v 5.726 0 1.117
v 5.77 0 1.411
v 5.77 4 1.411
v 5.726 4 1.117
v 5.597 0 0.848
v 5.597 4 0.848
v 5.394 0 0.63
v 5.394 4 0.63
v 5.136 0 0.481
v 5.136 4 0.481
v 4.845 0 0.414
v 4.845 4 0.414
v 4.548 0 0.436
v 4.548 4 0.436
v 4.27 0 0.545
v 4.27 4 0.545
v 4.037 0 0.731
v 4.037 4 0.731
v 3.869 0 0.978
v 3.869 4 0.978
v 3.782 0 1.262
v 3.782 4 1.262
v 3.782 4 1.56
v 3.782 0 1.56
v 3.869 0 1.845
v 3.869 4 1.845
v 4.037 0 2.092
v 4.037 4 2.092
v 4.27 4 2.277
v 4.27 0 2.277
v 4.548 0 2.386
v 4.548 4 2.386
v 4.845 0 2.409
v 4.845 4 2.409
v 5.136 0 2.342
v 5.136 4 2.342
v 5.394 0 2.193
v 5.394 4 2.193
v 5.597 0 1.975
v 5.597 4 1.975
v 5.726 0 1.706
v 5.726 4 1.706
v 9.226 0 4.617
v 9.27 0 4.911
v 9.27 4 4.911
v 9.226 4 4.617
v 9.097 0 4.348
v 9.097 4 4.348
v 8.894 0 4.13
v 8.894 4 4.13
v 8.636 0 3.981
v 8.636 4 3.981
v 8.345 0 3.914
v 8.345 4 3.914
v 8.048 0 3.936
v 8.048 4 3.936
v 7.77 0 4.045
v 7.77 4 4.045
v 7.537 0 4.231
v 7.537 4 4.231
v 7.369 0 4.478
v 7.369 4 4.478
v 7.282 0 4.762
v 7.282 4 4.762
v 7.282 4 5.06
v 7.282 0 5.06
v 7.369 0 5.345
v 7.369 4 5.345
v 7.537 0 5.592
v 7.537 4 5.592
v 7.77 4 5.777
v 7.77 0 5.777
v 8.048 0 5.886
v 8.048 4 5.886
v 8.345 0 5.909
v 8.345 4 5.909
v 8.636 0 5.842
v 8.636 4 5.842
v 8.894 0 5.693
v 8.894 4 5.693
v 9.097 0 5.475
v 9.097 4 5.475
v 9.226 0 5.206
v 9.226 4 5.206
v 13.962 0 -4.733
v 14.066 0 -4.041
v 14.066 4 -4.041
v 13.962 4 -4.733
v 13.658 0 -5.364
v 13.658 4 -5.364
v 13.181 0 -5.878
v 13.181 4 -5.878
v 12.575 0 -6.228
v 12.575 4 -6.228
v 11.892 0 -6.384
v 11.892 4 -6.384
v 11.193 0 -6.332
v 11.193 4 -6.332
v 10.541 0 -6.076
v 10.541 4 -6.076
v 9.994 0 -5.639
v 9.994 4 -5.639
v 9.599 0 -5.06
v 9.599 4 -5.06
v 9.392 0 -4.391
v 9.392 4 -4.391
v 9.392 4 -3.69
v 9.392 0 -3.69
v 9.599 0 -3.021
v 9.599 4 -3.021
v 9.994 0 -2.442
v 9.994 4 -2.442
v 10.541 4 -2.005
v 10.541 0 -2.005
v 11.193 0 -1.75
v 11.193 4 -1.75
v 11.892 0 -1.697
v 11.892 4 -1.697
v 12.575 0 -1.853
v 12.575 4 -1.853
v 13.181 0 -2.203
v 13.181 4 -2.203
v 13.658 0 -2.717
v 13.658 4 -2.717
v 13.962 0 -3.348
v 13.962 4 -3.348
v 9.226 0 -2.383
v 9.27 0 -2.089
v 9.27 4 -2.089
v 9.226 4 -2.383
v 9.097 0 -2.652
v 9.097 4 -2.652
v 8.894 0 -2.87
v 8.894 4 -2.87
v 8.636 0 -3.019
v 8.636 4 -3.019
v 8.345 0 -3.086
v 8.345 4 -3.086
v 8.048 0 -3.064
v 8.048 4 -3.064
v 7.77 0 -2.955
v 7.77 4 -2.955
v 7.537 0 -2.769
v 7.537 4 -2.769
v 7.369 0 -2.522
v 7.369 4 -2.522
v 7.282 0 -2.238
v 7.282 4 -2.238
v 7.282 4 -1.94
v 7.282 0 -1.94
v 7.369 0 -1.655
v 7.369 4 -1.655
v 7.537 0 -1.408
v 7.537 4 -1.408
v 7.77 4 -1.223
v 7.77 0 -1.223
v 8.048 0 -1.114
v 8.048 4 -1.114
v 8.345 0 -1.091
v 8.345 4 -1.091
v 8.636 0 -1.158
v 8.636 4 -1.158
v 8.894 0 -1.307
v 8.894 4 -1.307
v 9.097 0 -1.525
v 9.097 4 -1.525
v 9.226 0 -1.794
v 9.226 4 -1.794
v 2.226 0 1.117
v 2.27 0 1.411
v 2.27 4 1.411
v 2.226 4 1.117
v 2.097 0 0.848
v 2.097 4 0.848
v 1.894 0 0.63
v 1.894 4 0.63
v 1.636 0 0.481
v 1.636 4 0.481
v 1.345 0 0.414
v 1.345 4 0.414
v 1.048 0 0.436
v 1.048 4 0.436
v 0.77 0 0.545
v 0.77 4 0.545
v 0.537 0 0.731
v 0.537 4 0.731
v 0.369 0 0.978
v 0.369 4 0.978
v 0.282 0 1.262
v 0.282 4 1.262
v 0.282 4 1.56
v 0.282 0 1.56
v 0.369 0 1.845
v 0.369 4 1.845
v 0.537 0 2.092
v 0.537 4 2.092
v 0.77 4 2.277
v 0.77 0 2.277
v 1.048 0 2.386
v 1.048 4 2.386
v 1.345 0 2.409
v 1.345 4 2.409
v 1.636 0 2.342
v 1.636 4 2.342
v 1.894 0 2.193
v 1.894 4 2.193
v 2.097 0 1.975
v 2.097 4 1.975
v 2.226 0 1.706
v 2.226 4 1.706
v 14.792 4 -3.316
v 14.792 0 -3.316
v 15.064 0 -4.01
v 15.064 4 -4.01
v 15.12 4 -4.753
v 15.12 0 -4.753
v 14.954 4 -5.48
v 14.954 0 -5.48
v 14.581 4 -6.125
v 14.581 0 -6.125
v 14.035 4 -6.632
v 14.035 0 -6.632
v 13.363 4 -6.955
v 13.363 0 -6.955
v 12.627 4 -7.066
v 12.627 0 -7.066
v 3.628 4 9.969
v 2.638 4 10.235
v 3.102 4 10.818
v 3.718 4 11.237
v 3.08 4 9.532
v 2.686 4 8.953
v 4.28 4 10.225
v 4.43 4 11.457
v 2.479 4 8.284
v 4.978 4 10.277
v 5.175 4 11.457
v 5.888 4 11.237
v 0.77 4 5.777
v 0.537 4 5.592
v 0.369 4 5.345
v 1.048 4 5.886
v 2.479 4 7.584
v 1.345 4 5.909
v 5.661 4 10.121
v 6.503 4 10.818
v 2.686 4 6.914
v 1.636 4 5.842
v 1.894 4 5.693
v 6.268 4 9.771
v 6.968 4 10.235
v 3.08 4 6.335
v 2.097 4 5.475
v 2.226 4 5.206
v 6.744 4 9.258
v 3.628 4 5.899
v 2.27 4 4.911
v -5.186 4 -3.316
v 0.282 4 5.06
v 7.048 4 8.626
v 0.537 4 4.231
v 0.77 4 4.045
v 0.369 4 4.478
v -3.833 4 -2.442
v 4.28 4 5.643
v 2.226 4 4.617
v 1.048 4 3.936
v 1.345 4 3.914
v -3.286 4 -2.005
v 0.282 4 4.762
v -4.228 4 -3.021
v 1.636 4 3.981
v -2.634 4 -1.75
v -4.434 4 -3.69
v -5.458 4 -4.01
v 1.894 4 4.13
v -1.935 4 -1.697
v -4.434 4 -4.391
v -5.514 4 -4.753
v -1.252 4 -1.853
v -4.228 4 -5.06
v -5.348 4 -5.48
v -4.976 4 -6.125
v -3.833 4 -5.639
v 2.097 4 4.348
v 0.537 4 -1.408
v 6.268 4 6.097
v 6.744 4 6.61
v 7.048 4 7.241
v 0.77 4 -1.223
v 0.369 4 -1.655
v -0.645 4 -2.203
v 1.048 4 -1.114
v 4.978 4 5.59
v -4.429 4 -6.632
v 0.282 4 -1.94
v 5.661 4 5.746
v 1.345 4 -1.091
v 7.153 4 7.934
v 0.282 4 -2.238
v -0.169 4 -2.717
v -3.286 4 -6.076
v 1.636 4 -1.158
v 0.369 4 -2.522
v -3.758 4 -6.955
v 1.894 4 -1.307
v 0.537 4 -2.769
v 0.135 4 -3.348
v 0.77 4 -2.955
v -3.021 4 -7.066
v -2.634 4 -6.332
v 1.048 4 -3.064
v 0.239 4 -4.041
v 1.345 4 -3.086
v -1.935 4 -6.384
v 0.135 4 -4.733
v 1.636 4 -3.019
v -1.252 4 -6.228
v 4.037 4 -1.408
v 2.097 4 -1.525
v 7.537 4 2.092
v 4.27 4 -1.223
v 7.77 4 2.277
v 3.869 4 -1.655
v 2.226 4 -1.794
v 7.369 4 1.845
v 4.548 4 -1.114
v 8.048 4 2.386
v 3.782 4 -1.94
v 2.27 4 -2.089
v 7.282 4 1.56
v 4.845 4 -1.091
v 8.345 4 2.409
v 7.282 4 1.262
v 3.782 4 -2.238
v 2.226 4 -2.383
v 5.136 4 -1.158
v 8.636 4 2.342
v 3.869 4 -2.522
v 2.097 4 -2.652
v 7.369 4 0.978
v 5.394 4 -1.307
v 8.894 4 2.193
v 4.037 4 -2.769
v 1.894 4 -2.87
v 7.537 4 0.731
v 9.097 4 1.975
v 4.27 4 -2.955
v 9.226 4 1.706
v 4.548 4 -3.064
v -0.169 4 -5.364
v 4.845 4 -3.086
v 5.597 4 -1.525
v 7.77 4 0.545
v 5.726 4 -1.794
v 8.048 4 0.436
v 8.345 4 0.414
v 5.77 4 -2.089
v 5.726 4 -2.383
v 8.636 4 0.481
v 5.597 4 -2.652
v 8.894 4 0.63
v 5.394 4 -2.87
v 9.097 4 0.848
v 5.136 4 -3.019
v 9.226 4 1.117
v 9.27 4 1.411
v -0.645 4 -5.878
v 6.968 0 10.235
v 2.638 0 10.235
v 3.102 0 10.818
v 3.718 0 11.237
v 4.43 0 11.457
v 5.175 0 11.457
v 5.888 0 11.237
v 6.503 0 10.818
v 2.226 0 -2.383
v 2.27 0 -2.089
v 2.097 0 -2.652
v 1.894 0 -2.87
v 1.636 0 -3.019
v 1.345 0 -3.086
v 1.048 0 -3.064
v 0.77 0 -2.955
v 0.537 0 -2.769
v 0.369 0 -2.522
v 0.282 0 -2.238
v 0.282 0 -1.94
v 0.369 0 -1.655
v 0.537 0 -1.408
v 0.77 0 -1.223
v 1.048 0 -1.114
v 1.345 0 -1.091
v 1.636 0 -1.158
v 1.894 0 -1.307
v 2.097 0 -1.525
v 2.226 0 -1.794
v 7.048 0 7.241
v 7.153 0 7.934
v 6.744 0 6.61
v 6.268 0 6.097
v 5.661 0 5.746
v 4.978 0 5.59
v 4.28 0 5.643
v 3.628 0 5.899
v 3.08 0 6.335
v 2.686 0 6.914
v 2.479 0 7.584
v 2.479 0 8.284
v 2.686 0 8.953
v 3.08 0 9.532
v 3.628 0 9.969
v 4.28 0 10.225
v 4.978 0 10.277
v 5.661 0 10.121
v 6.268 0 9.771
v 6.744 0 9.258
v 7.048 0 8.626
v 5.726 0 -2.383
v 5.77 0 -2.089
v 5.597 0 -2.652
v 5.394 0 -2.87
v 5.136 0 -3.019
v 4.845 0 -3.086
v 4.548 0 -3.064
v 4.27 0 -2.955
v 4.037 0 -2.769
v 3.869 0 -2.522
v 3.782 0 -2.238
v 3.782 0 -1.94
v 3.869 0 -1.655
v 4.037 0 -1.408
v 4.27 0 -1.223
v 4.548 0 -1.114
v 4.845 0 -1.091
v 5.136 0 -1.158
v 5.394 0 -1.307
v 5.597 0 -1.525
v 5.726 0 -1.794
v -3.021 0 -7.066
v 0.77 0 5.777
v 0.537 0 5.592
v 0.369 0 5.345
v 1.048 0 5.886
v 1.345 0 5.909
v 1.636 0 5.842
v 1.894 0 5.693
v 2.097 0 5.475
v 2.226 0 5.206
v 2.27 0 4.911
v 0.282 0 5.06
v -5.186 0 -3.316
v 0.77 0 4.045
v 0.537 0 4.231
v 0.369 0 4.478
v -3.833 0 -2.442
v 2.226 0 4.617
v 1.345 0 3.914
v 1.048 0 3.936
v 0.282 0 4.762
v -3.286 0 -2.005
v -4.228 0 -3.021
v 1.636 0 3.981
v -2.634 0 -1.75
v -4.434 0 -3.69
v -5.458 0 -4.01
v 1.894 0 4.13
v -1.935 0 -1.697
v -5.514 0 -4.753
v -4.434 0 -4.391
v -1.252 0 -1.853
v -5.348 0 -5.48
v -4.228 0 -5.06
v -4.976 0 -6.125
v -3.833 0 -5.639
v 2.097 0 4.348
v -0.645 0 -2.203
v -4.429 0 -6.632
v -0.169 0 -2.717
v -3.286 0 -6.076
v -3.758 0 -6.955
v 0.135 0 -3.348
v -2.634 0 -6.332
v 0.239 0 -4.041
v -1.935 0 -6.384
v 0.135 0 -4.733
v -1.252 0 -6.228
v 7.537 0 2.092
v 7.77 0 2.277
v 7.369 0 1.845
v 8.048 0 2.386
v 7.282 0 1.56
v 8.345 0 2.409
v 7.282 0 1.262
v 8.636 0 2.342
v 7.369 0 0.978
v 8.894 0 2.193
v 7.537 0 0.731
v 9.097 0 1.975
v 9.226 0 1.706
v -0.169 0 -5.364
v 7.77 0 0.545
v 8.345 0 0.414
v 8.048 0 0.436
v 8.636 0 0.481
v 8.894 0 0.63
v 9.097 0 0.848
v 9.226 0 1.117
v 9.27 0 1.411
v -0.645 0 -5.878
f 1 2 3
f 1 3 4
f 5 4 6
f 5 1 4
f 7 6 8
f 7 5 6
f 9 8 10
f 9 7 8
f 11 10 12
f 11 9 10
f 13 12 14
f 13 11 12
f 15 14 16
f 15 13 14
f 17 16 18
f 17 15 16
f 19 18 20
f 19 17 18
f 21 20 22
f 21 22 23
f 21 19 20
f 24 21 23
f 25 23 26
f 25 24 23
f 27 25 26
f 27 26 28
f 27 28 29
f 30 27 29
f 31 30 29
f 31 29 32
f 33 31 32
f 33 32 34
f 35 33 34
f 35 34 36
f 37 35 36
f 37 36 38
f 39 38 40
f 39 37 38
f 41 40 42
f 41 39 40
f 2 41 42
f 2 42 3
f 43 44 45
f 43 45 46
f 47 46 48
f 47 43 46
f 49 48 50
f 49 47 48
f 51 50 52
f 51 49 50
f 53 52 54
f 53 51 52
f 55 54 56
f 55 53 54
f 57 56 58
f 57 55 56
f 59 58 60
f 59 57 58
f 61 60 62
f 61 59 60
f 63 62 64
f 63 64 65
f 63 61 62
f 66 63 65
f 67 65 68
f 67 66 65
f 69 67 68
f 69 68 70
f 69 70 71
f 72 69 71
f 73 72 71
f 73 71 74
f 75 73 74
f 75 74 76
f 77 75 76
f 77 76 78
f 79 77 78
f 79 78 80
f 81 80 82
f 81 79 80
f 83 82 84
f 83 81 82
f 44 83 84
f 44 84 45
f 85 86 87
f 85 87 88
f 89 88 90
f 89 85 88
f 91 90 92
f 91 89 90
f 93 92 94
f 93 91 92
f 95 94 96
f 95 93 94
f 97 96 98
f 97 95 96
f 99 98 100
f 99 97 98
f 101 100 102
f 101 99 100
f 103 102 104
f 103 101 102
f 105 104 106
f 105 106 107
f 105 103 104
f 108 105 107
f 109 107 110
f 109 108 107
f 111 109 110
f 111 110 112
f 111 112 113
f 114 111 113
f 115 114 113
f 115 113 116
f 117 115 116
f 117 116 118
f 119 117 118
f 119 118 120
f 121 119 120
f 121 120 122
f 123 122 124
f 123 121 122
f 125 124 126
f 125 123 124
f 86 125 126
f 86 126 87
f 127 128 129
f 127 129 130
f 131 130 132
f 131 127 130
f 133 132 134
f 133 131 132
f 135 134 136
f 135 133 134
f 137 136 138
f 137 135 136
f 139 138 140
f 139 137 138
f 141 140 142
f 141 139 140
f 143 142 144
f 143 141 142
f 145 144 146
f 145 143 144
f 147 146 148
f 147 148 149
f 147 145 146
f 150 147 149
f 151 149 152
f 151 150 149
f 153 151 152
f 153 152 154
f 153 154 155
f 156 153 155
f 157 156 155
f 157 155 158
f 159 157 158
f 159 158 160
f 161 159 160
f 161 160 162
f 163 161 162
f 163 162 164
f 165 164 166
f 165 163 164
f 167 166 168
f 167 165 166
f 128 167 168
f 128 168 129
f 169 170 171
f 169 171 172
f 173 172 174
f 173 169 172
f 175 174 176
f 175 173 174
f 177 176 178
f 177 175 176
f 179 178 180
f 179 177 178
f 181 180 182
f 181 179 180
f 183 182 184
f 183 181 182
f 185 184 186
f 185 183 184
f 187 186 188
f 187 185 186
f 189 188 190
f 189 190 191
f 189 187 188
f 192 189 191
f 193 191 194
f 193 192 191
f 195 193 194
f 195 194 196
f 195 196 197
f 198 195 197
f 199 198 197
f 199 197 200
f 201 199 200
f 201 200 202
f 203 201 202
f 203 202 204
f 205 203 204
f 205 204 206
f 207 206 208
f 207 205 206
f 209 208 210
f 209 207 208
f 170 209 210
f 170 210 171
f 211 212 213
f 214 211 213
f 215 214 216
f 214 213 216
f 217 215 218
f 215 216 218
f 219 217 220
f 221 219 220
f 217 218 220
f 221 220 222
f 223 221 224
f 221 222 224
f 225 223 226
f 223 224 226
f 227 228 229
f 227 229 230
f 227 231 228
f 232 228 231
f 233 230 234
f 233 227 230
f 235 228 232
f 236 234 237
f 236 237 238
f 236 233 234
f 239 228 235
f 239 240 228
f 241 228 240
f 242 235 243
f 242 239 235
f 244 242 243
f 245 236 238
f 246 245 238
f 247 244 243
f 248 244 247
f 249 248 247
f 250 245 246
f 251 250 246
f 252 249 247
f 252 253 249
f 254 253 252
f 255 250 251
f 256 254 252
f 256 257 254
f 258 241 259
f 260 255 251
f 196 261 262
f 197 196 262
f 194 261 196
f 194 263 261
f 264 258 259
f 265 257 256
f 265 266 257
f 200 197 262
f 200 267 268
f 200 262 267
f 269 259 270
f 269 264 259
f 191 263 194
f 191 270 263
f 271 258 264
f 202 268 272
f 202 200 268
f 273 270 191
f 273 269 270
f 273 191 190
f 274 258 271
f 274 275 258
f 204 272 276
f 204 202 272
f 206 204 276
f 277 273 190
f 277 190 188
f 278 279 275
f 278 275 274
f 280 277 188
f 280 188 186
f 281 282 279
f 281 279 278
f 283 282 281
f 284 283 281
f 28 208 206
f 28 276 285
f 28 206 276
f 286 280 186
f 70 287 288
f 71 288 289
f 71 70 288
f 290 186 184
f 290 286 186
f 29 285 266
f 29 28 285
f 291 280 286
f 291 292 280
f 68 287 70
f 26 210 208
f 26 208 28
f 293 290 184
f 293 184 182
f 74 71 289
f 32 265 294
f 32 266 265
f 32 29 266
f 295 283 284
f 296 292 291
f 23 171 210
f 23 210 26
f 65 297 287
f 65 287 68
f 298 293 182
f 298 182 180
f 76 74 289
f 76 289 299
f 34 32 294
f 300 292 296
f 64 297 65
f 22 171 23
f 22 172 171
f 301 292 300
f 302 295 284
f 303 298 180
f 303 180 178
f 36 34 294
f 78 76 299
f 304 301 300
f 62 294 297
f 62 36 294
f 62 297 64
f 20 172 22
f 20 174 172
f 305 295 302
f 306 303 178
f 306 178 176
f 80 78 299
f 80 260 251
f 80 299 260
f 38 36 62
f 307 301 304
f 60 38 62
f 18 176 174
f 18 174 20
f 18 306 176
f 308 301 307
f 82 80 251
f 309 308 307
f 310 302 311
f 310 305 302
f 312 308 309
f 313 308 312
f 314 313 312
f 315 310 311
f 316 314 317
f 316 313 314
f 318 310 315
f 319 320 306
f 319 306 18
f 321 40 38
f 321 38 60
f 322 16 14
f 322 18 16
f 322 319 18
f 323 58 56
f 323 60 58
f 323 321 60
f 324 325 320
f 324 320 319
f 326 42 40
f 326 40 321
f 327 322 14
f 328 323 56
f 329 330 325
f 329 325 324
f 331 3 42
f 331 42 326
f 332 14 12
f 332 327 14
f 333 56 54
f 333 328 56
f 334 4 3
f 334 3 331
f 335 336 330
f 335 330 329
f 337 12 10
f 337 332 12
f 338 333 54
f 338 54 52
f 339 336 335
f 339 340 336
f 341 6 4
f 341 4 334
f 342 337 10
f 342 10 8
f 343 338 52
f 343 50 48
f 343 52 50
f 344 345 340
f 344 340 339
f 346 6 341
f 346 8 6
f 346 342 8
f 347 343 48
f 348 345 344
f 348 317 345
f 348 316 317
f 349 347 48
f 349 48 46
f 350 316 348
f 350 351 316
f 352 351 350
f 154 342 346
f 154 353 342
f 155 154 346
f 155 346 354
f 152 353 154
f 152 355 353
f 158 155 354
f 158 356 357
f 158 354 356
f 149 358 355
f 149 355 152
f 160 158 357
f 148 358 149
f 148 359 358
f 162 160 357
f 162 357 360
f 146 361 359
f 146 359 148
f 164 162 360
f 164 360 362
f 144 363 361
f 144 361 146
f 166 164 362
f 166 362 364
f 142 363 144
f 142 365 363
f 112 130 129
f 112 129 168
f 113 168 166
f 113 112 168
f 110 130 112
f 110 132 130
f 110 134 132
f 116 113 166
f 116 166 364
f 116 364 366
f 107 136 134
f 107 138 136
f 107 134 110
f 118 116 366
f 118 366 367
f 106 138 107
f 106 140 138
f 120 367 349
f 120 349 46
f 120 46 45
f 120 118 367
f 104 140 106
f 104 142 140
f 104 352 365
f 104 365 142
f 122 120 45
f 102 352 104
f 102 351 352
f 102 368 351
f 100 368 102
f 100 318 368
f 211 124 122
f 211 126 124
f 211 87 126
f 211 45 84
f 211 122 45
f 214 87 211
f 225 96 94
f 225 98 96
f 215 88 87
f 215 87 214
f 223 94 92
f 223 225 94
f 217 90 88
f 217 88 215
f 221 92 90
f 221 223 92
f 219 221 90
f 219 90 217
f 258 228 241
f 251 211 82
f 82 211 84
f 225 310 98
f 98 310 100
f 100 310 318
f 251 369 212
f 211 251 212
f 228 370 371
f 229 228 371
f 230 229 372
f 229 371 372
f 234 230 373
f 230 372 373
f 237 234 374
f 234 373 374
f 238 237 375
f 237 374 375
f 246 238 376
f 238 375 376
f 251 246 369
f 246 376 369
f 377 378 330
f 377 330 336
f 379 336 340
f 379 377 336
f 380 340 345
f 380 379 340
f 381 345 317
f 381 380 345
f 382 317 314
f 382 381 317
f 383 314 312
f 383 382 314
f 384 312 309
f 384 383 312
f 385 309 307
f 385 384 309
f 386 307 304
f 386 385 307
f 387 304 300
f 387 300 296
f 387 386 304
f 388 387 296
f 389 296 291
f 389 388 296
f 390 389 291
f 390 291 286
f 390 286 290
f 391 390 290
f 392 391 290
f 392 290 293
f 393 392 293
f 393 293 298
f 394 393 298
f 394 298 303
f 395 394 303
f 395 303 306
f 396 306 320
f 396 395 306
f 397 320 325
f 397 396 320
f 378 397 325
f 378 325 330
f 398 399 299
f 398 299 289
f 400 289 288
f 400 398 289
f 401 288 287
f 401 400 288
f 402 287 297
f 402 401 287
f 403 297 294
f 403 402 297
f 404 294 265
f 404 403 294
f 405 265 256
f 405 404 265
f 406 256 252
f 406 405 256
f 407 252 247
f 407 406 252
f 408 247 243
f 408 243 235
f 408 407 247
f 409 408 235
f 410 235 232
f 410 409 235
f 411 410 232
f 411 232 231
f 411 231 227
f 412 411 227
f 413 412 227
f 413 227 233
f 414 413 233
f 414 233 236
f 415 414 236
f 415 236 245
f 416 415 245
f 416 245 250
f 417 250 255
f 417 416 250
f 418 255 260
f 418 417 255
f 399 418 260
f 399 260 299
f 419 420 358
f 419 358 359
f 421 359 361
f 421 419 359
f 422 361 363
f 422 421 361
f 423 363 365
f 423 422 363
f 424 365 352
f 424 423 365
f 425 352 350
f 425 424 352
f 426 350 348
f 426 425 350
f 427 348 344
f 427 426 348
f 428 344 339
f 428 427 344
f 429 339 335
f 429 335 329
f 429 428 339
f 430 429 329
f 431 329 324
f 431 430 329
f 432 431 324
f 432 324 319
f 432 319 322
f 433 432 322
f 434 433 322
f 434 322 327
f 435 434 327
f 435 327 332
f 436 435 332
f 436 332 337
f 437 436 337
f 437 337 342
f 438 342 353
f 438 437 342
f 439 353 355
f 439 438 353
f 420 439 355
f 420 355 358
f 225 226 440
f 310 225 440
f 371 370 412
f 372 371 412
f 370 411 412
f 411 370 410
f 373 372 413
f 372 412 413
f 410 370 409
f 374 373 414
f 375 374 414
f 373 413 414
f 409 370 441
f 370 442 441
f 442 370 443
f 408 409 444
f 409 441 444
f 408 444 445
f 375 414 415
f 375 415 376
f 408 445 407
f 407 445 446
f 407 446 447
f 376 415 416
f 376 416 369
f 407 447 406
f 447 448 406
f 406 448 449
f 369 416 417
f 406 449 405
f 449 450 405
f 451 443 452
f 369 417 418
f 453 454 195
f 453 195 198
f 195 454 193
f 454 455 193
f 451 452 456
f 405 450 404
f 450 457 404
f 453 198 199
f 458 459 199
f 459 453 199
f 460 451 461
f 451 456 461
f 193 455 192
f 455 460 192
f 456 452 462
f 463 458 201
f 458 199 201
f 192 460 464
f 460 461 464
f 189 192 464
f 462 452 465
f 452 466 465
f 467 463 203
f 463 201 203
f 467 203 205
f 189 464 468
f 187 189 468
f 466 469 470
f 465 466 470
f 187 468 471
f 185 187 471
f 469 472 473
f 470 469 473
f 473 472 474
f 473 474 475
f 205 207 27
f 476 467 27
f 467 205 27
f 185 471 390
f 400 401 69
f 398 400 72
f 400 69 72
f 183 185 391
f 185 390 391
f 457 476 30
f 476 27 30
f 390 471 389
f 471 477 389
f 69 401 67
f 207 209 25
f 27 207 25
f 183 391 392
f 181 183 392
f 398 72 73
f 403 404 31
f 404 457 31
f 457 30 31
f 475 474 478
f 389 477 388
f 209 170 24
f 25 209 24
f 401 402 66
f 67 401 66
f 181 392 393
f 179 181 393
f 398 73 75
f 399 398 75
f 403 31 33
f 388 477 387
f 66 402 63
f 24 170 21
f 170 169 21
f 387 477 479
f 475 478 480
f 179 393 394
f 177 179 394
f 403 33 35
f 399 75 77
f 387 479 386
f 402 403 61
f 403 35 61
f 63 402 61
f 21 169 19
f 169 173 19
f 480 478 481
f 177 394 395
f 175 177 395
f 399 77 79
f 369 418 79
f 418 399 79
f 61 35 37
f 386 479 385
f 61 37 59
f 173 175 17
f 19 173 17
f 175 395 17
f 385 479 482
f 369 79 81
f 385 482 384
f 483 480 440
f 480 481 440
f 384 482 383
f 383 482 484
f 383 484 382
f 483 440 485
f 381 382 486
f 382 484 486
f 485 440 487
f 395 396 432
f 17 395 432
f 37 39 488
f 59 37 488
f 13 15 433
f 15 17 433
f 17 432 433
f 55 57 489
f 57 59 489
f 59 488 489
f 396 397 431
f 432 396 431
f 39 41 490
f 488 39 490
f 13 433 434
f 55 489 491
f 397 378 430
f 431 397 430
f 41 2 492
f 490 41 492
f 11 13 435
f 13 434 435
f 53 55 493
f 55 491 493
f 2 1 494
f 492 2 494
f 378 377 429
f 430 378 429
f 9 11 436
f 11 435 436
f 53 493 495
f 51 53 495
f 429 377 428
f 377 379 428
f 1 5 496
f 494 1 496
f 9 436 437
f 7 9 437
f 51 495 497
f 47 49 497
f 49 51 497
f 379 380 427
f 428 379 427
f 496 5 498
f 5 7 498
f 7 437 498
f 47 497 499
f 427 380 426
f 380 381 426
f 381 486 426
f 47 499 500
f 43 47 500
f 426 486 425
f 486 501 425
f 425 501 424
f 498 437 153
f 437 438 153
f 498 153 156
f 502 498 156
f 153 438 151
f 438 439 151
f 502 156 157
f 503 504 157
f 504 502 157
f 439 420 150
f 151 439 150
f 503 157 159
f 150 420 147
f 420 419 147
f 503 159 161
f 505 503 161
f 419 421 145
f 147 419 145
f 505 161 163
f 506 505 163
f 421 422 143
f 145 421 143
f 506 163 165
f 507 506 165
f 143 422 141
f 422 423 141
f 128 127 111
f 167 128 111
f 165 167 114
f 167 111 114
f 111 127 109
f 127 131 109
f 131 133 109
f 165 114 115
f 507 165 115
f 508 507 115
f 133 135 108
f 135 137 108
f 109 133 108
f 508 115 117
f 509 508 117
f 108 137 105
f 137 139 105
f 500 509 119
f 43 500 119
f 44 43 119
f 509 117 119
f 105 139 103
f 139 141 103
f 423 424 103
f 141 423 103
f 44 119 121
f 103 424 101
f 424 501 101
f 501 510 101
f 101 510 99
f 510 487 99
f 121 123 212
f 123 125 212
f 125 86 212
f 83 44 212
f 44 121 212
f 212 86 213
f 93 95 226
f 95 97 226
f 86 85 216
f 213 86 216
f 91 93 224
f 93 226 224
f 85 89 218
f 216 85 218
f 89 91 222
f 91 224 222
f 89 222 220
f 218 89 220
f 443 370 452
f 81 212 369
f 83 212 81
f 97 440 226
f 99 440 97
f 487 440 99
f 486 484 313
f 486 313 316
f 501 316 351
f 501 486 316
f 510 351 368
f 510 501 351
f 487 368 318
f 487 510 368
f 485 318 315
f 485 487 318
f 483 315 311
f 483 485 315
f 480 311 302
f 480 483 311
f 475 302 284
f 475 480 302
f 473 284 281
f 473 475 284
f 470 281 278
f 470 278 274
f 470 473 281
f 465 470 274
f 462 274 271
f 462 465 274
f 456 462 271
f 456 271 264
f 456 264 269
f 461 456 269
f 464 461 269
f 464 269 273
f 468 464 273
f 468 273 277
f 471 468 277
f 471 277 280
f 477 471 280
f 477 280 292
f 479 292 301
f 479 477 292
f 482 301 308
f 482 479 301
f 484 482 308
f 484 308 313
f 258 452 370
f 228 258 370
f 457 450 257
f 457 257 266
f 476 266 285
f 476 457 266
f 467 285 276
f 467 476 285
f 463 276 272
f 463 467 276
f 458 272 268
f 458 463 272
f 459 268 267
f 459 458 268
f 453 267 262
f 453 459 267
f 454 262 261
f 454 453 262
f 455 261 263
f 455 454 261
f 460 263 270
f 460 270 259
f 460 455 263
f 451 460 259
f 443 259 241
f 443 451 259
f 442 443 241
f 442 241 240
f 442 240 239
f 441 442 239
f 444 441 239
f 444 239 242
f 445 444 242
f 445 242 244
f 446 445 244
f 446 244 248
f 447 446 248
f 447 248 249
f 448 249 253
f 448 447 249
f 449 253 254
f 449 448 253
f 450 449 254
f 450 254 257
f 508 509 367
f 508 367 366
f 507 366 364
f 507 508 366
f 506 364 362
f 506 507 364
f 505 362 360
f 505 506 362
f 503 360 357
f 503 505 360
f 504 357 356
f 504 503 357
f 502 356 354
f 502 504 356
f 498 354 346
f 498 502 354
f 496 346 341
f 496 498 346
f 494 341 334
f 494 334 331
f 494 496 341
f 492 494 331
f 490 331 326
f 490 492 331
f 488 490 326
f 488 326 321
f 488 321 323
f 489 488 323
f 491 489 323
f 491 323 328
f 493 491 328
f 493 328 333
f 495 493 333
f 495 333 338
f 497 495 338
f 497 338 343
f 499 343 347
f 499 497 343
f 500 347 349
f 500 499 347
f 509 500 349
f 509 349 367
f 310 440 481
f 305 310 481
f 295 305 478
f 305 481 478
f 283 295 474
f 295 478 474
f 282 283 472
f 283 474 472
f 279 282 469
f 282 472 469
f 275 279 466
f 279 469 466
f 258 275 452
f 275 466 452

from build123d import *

# Parameters (mm, degrees)
SKETCH1_R      = 2.35
SKETCH1_R_2    = 1
EXTRUDE1_DEPTH = 4


with BuildPart() as part:
    # Sketch1 → Extrude1 (new body)
    with BuildSketch(Plane(origin=(0, 0, 0), x_dir=(1, 0, 0), z_dir=(0, 1, 0))):
        with BuildLine():
            Line((-5.186041147, 3.316192399), (2.637731834, -10.234979911))
            ThreePointArc((2.637731834, -10.234979911), (4.802795343, -11.484979911), (6.967858853, -10.234979911))
            Line((6.967858853, -10.234979911), (14.791631834, 3.316192399))
            ThreePointArc((14.791631834, 3.316192399), (14.791631834, 5.816192399), (12.626568324, 7.066192399))
            Line((12.626568324, 7.066192399), (-3.020977638, 7.066192399))
            ThreePointArc((-3.020977638, 7.066192399), (-5.186041147, 5.816192399), (-5.186041147, 3.316192399))
        make_face()
        with Locations((-2.110635714, 4.040606244)):
            Circle(SKETCH1_R, mode=Mode.SUBTRACT)
        with Locations((4.802795343, -7.933807601)):
            Circle(SKETCH1_R, mode=Mode.SUBTRACT)
        with Locations((11.7162264, 4.040606244)):
            Circle(SKETCH1_R, mode=Mode.SUBTRACT)
        with Locations((1.270334632, 2.088602105)):
            Circle(SKETCH1_R_2, mode=Mode.SUBTRACT)
        with Locations((4.770334632, 2.088602105)):
            Circle(SKETCH1_R_2, mode=Mode.SUBTRACT)
        with Locations((8.270334632, 2.088602105)):
            Circle(SKETCH1_R_2, mode=Mode.SUBTRACT)
        with Locations((1.270334632, -1.411397895)):
            Circle(SKETCH1_R_2, mode=Mode.SUBTRACT)
        with Locations((4.770334632, -1.411397895)):
            Circle(SKETCH1_R_2, mode=Mode.SUBTRACT)
        with Locations((8.270334632, -1.411397895)):
            Circle(SKETCH1_R_2, mode=Mode.SUBTRACT)
        with Locations((1.270334632, -4.911397895)):
            Circle(SKETCH1_R_2, mode=Mode.SUBTRACT)
        with Locations((8.270334632, -4.911397895)):
            Circle(SKETCH1_R_2, mode=Mode.SUBTRACT)
    extrude(amount=EXTRUDE1_DEPTH)


solid = part.part
